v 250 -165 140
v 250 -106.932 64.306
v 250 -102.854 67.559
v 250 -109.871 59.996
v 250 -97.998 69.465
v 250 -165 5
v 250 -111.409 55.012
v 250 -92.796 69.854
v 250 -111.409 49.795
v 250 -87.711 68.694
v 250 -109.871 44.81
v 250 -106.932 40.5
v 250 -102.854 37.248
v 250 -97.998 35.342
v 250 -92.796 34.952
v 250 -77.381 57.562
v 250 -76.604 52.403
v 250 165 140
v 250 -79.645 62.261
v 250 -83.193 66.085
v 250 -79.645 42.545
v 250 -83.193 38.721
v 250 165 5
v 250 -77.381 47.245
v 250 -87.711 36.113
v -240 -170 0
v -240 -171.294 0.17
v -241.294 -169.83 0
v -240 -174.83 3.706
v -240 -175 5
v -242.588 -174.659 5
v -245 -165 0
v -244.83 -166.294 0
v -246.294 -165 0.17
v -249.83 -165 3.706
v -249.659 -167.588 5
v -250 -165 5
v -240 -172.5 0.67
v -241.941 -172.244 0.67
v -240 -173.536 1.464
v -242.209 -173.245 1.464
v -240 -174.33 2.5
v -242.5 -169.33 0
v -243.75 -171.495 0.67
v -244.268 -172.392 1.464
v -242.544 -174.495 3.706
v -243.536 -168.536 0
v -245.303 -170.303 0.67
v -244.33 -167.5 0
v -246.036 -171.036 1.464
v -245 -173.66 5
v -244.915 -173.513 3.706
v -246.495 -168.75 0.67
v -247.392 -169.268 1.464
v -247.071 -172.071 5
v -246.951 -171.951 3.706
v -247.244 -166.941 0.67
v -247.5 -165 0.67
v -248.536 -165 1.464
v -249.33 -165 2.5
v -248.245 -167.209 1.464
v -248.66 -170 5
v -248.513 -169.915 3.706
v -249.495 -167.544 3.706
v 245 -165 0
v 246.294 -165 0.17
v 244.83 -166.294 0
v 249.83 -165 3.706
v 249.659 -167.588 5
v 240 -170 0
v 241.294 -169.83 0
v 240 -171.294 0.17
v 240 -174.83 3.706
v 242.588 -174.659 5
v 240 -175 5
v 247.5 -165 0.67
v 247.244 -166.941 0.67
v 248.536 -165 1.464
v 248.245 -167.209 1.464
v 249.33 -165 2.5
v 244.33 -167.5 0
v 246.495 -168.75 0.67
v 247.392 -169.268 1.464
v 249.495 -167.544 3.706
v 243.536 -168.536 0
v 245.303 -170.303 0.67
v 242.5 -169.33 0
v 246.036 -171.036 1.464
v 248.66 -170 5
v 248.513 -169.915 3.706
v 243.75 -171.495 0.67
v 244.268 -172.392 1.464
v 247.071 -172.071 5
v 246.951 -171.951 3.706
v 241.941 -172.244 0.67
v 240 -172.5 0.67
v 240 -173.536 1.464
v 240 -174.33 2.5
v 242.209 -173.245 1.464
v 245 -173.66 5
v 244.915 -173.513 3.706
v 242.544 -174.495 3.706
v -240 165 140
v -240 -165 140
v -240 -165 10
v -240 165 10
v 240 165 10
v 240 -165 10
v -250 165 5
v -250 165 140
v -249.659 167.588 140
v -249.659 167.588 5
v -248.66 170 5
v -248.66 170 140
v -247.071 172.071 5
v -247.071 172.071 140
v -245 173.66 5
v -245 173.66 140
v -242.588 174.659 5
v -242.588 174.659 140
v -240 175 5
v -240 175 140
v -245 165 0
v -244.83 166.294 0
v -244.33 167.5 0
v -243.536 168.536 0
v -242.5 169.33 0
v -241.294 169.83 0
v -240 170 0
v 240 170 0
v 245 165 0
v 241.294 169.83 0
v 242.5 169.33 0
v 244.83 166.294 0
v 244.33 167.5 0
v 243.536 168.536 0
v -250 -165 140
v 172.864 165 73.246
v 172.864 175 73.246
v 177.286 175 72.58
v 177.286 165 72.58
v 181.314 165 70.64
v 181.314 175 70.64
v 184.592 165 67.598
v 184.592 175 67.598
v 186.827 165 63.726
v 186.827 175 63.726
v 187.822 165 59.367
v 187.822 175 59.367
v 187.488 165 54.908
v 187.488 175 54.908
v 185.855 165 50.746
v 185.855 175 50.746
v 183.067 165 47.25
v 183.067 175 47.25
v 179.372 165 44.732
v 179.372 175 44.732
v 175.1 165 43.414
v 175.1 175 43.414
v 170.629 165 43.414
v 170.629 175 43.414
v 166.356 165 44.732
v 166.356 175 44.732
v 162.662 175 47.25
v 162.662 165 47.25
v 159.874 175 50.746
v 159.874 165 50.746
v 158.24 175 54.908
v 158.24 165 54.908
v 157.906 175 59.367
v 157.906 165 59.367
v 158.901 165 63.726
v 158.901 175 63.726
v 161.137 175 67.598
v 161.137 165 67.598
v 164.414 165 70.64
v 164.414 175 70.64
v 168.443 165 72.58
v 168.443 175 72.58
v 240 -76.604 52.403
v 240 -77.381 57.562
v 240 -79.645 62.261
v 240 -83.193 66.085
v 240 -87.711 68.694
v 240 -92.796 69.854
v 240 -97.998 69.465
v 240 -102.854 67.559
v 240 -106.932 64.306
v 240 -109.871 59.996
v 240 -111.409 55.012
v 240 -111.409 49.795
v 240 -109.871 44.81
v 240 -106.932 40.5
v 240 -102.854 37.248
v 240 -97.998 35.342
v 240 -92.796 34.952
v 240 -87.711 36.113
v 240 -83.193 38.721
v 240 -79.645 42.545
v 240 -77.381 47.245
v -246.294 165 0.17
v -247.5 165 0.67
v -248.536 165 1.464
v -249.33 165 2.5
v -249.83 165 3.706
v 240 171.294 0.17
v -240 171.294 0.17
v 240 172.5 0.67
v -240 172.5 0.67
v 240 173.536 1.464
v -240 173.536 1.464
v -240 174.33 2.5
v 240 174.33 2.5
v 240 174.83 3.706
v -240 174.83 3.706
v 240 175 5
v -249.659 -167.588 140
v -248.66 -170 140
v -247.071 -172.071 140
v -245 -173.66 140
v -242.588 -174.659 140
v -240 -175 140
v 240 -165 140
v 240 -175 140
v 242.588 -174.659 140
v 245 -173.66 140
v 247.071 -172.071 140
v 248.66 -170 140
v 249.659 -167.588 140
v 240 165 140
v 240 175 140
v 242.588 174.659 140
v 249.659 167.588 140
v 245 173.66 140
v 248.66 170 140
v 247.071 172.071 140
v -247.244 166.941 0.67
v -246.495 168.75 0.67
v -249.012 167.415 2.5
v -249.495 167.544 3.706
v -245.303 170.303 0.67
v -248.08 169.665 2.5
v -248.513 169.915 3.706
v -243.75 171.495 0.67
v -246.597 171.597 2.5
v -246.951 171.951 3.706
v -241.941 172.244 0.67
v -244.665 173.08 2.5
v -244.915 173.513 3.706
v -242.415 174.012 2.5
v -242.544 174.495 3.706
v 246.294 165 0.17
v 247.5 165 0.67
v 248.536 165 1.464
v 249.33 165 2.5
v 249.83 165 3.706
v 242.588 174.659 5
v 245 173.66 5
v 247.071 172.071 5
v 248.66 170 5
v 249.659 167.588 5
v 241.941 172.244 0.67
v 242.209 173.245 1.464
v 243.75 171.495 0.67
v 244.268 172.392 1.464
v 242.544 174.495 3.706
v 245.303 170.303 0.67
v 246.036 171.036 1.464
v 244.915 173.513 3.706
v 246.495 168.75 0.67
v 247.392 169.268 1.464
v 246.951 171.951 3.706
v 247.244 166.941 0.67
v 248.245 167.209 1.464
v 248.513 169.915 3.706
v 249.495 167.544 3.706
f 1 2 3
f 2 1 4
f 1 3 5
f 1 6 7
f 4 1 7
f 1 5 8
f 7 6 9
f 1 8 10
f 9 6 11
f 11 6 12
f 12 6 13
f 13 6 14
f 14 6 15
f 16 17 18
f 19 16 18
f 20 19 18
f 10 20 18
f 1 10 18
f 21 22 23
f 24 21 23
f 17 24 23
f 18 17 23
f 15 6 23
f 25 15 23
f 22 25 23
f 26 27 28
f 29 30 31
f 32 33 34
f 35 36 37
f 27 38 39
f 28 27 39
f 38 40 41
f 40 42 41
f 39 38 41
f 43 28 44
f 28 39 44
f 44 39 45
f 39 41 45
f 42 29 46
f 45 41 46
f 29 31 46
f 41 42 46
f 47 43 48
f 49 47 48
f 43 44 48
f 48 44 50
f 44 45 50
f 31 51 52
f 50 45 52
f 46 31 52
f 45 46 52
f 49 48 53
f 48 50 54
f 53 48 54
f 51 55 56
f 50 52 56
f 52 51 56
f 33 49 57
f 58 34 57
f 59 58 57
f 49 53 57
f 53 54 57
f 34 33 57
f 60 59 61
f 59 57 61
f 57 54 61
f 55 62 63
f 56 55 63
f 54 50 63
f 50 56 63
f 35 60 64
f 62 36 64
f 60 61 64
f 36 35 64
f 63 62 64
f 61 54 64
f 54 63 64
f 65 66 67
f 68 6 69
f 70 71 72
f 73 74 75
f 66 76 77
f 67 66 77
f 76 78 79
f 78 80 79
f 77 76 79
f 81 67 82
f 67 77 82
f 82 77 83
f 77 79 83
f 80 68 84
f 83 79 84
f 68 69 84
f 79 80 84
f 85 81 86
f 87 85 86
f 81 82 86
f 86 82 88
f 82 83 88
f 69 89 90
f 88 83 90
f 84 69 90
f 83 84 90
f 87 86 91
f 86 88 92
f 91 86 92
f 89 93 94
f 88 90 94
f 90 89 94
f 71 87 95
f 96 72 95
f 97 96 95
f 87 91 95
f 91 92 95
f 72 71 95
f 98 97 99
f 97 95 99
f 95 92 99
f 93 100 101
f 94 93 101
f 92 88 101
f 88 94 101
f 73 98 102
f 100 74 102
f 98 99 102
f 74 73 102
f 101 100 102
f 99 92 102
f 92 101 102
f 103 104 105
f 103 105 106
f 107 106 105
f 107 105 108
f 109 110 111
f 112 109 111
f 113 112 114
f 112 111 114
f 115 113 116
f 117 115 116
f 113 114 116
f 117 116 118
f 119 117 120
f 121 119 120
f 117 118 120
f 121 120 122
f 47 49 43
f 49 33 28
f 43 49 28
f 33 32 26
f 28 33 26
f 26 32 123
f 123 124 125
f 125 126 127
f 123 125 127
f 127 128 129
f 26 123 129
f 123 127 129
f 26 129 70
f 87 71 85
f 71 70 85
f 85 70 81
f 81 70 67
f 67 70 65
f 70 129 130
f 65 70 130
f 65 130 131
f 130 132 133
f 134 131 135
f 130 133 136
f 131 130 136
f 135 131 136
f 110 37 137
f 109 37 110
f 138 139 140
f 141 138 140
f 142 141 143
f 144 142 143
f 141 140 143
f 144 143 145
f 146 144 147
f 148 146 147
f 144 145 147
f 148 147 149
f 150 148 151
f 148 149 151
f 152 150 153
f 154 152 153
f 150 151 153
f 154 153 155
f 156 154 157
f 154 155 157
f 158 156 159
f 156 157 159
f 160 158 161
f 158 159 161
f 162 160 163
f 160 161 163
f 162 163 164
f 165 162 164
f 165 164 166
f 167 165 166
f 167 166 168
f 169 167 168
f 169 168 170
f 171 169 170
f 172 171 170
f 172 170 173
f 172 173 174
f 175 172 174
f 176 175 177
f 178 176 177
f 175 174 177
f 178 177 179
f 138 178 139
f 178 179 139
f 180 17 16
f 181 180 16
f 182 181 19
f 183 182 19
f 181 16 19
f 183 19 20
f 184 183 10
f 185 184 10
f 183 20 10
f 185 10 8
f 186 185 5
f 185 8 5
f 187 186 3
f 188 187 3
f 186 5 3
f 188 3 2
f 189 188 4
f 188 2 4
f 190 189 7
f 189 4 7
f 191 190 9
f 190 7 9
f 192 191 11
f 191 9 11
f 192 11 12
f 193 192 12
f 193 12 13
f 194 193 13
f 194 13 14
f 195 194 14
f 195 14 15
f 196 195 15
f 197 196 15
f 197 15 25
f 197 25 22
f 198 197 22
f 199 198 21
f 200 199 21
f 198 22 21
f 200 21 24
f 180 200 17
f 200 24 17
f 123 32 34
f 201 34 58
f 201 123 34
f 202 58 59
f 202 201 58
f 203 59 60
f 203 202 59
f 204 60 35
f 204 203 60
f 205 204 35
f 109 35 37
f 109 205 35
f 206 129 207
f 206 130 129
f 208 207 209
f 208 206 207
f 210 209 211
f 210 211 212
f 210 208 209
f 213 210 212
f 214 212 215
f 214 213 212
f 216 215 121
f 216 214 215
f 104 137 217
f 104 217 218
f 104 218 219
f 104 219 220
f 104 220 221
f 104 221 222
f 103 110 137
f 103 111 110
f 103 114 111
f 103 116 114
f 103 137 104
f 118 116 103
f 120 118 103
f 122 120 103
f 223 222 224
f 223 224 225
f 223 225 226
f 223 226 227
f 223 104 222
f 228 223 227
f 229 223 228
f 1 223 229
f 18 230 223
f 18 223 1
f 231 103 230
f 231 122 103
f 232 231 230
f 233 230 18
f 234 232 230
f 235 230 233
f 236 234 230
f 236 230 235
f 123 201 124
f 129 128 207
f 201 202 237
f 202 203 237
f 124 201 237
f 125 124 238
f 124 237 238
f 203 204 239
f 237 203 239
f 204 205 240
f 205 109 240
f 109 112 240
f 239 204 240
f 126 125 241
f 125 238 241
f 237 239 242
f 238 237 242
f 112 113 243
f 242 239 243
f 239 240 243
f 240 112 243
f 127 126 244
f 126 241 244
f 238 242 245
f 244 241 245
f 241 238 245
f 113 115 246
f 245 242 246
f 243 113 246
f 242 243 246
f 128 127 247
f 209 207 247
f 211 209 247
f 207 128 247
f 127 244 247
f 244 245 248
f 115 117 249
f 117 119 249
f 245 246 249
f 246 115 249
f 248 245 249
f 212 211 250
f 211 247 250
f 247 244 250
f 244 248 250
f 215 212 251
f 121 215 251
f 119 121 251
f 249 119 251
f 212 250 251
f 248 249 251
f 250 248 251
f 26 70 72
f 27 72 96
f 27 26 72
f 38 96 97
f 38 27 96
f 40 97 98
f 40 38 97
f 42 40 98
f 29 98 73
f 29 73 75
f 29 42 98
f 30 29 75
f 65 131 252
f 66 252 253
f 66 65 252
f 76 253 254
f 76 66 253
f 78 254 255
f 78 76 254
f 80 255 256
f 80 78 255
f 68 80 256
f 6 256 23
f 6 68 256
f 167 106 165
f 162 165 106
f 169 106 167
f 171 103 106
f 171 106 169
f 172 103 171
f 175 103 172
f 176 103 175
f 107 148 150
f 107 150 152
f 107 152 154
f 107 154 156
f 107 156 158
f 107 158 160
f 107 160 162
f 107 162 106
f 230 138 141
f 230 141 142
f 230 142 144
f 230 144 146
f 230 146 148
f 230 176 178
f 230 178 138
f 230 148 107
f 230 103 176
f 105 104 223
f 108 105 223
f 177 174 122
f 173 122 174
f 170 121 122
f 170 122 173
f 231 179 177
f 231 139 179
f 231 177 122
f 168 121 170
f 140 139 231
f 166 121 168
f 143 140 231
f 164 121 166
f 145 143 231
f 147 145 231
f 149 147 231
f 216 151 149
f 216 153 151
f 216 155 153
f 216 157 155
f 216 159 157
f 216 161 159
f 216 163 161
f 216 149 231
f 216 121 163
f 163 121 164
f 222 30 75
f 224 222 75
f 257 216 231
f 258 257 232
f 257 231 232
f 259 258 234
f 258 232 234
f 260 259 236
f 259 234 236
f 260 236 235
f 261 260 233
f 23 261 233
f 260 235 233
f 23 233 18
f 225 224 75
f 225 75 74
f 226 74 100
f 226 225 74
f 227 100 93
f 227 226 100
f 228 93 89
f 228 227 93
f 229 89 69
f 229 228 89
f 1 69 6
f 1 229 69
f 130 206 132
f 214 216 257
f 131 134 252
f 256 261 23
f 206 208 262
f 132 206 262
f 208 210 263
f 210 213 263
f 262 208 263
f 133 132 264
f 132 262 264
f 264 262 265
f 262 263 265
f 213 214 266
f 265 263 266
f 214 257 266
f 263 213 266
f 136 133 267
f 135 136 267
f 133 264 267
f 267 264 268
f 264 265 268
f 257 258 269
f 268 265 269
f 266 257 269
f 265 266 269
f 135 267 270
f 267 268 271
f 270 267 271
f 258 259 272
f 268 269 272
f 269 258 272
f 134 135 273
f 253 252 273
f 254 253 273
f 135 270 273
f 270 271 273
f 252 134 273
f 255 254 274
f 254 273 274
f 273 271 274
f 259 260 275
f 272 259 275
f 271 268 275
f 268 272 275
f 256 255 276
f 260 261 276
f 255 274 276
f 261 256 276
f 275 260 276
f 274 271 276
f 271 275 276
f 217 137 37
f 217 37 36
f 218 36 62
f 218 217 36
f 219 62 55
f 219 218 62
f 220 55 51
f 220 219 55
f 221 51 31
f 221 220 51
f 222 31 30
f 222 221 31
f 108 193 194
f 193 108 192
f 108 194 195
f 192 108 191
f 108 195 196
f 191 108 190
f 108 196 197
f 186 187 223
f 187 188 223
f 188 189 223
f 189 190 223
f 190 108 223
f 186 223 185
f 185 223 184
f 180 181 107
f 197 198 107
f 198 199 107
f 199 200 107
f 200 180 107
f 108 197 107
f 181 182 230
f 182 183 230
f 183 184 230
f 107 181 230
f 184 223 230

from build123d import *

# Parameters (mm, degrees)
SKETCH1_W           = 500
SKETCH1_H           = 350
BOSS_EXTRUDE2_DEPTH = 140
SKETCH2_R           = 17.5
CUT_EXTRUDE1_DEPTH  = 10
SKETCH3_R           = 15
CUT_EXTRUDE2_DEPTH  = 10
SKETCH4_W           = 480
SKETCH4_H           = 330
CUT_EXTRUDE3_DEPTH  = 130
FILLET1_R           = 10
FILLET3_R           = 5


with BuildPart() as part:
    # Sketch1 → Boss-Extrude2 (new body)
    with BuildSketch(Plane.XY):
        Rectangle(SKETCH1_W, SKETCH1_H)
    extrude(amount=BOSS_EXTRUDE2_DEPTH)

    # Sketch2 → Cut-Extrude1 (cut)
    with BuildSketch(Plane(origin=(250, 0, 0), x_dir=(0, 0, -1), z_dir=(1, 0, 0))):
        with Locations(Location((-52.403317004, -94.104000371, 0), (0, 0, 90))):
            Circle(SKETCH2_R)
    extrude(amount=-CUT_EXTRUDE1_DEPTH, mode=Mode.SUBTRACT)

    # Sketch3 → Cut-Extrude2 (cut)
    with BuildSketch(Plane(origin=(0, 175, 0), x_dir=(1, 0, 0), z_dir=(0, 1, 0))):
        with Locations(Location((172.864228893, -58.246086874, 0), (0, 0, 270))):
            Circle(SKETCH3_R)
    extrude(amount=-CUT_EXTRUDE2_DEPTH, mode=Mode.SUBTRACT)

    # Sketch4 → Cut-Extrude3 (cut)
    with BuildSketch(Plane.XY.offset(140)):
        Rectangle(SKETCH4_W, SKETCH4_H)
    extrude(amount=-CUT_EXTRUDE3_DEPTH, mode=Mode.SUBTRACT)

    # Fillet1
    fillet1_edges = [part.edges().sort_by_distance(p)[0] for p in [
        (250, -175, 70),
        (-250, -175, 70),
        (-250, 175, 70),
        (250, 175, 70),
    ]]
    fillet(fillet1_edges, radius=FILLET1_R)

    # Fillet3
    fillet3_edges = [part.edges().sort_by_distance(p)[0] for p in [
        (0, 175, 0),
        (250, 0, 0),
        (0, -175, 0),
        (-250, 0, 0),
        (-247.071067812, -172.071067812, 0),
        (-247.071067812, 172.071067812, 0),
        (247.071067812, -172.071067812, 0),
        (247.071067812, 172.071067812, 0),
    ]]
    fillet(fillet3_edges, radius=FILLET3_R)


solid = part.part
